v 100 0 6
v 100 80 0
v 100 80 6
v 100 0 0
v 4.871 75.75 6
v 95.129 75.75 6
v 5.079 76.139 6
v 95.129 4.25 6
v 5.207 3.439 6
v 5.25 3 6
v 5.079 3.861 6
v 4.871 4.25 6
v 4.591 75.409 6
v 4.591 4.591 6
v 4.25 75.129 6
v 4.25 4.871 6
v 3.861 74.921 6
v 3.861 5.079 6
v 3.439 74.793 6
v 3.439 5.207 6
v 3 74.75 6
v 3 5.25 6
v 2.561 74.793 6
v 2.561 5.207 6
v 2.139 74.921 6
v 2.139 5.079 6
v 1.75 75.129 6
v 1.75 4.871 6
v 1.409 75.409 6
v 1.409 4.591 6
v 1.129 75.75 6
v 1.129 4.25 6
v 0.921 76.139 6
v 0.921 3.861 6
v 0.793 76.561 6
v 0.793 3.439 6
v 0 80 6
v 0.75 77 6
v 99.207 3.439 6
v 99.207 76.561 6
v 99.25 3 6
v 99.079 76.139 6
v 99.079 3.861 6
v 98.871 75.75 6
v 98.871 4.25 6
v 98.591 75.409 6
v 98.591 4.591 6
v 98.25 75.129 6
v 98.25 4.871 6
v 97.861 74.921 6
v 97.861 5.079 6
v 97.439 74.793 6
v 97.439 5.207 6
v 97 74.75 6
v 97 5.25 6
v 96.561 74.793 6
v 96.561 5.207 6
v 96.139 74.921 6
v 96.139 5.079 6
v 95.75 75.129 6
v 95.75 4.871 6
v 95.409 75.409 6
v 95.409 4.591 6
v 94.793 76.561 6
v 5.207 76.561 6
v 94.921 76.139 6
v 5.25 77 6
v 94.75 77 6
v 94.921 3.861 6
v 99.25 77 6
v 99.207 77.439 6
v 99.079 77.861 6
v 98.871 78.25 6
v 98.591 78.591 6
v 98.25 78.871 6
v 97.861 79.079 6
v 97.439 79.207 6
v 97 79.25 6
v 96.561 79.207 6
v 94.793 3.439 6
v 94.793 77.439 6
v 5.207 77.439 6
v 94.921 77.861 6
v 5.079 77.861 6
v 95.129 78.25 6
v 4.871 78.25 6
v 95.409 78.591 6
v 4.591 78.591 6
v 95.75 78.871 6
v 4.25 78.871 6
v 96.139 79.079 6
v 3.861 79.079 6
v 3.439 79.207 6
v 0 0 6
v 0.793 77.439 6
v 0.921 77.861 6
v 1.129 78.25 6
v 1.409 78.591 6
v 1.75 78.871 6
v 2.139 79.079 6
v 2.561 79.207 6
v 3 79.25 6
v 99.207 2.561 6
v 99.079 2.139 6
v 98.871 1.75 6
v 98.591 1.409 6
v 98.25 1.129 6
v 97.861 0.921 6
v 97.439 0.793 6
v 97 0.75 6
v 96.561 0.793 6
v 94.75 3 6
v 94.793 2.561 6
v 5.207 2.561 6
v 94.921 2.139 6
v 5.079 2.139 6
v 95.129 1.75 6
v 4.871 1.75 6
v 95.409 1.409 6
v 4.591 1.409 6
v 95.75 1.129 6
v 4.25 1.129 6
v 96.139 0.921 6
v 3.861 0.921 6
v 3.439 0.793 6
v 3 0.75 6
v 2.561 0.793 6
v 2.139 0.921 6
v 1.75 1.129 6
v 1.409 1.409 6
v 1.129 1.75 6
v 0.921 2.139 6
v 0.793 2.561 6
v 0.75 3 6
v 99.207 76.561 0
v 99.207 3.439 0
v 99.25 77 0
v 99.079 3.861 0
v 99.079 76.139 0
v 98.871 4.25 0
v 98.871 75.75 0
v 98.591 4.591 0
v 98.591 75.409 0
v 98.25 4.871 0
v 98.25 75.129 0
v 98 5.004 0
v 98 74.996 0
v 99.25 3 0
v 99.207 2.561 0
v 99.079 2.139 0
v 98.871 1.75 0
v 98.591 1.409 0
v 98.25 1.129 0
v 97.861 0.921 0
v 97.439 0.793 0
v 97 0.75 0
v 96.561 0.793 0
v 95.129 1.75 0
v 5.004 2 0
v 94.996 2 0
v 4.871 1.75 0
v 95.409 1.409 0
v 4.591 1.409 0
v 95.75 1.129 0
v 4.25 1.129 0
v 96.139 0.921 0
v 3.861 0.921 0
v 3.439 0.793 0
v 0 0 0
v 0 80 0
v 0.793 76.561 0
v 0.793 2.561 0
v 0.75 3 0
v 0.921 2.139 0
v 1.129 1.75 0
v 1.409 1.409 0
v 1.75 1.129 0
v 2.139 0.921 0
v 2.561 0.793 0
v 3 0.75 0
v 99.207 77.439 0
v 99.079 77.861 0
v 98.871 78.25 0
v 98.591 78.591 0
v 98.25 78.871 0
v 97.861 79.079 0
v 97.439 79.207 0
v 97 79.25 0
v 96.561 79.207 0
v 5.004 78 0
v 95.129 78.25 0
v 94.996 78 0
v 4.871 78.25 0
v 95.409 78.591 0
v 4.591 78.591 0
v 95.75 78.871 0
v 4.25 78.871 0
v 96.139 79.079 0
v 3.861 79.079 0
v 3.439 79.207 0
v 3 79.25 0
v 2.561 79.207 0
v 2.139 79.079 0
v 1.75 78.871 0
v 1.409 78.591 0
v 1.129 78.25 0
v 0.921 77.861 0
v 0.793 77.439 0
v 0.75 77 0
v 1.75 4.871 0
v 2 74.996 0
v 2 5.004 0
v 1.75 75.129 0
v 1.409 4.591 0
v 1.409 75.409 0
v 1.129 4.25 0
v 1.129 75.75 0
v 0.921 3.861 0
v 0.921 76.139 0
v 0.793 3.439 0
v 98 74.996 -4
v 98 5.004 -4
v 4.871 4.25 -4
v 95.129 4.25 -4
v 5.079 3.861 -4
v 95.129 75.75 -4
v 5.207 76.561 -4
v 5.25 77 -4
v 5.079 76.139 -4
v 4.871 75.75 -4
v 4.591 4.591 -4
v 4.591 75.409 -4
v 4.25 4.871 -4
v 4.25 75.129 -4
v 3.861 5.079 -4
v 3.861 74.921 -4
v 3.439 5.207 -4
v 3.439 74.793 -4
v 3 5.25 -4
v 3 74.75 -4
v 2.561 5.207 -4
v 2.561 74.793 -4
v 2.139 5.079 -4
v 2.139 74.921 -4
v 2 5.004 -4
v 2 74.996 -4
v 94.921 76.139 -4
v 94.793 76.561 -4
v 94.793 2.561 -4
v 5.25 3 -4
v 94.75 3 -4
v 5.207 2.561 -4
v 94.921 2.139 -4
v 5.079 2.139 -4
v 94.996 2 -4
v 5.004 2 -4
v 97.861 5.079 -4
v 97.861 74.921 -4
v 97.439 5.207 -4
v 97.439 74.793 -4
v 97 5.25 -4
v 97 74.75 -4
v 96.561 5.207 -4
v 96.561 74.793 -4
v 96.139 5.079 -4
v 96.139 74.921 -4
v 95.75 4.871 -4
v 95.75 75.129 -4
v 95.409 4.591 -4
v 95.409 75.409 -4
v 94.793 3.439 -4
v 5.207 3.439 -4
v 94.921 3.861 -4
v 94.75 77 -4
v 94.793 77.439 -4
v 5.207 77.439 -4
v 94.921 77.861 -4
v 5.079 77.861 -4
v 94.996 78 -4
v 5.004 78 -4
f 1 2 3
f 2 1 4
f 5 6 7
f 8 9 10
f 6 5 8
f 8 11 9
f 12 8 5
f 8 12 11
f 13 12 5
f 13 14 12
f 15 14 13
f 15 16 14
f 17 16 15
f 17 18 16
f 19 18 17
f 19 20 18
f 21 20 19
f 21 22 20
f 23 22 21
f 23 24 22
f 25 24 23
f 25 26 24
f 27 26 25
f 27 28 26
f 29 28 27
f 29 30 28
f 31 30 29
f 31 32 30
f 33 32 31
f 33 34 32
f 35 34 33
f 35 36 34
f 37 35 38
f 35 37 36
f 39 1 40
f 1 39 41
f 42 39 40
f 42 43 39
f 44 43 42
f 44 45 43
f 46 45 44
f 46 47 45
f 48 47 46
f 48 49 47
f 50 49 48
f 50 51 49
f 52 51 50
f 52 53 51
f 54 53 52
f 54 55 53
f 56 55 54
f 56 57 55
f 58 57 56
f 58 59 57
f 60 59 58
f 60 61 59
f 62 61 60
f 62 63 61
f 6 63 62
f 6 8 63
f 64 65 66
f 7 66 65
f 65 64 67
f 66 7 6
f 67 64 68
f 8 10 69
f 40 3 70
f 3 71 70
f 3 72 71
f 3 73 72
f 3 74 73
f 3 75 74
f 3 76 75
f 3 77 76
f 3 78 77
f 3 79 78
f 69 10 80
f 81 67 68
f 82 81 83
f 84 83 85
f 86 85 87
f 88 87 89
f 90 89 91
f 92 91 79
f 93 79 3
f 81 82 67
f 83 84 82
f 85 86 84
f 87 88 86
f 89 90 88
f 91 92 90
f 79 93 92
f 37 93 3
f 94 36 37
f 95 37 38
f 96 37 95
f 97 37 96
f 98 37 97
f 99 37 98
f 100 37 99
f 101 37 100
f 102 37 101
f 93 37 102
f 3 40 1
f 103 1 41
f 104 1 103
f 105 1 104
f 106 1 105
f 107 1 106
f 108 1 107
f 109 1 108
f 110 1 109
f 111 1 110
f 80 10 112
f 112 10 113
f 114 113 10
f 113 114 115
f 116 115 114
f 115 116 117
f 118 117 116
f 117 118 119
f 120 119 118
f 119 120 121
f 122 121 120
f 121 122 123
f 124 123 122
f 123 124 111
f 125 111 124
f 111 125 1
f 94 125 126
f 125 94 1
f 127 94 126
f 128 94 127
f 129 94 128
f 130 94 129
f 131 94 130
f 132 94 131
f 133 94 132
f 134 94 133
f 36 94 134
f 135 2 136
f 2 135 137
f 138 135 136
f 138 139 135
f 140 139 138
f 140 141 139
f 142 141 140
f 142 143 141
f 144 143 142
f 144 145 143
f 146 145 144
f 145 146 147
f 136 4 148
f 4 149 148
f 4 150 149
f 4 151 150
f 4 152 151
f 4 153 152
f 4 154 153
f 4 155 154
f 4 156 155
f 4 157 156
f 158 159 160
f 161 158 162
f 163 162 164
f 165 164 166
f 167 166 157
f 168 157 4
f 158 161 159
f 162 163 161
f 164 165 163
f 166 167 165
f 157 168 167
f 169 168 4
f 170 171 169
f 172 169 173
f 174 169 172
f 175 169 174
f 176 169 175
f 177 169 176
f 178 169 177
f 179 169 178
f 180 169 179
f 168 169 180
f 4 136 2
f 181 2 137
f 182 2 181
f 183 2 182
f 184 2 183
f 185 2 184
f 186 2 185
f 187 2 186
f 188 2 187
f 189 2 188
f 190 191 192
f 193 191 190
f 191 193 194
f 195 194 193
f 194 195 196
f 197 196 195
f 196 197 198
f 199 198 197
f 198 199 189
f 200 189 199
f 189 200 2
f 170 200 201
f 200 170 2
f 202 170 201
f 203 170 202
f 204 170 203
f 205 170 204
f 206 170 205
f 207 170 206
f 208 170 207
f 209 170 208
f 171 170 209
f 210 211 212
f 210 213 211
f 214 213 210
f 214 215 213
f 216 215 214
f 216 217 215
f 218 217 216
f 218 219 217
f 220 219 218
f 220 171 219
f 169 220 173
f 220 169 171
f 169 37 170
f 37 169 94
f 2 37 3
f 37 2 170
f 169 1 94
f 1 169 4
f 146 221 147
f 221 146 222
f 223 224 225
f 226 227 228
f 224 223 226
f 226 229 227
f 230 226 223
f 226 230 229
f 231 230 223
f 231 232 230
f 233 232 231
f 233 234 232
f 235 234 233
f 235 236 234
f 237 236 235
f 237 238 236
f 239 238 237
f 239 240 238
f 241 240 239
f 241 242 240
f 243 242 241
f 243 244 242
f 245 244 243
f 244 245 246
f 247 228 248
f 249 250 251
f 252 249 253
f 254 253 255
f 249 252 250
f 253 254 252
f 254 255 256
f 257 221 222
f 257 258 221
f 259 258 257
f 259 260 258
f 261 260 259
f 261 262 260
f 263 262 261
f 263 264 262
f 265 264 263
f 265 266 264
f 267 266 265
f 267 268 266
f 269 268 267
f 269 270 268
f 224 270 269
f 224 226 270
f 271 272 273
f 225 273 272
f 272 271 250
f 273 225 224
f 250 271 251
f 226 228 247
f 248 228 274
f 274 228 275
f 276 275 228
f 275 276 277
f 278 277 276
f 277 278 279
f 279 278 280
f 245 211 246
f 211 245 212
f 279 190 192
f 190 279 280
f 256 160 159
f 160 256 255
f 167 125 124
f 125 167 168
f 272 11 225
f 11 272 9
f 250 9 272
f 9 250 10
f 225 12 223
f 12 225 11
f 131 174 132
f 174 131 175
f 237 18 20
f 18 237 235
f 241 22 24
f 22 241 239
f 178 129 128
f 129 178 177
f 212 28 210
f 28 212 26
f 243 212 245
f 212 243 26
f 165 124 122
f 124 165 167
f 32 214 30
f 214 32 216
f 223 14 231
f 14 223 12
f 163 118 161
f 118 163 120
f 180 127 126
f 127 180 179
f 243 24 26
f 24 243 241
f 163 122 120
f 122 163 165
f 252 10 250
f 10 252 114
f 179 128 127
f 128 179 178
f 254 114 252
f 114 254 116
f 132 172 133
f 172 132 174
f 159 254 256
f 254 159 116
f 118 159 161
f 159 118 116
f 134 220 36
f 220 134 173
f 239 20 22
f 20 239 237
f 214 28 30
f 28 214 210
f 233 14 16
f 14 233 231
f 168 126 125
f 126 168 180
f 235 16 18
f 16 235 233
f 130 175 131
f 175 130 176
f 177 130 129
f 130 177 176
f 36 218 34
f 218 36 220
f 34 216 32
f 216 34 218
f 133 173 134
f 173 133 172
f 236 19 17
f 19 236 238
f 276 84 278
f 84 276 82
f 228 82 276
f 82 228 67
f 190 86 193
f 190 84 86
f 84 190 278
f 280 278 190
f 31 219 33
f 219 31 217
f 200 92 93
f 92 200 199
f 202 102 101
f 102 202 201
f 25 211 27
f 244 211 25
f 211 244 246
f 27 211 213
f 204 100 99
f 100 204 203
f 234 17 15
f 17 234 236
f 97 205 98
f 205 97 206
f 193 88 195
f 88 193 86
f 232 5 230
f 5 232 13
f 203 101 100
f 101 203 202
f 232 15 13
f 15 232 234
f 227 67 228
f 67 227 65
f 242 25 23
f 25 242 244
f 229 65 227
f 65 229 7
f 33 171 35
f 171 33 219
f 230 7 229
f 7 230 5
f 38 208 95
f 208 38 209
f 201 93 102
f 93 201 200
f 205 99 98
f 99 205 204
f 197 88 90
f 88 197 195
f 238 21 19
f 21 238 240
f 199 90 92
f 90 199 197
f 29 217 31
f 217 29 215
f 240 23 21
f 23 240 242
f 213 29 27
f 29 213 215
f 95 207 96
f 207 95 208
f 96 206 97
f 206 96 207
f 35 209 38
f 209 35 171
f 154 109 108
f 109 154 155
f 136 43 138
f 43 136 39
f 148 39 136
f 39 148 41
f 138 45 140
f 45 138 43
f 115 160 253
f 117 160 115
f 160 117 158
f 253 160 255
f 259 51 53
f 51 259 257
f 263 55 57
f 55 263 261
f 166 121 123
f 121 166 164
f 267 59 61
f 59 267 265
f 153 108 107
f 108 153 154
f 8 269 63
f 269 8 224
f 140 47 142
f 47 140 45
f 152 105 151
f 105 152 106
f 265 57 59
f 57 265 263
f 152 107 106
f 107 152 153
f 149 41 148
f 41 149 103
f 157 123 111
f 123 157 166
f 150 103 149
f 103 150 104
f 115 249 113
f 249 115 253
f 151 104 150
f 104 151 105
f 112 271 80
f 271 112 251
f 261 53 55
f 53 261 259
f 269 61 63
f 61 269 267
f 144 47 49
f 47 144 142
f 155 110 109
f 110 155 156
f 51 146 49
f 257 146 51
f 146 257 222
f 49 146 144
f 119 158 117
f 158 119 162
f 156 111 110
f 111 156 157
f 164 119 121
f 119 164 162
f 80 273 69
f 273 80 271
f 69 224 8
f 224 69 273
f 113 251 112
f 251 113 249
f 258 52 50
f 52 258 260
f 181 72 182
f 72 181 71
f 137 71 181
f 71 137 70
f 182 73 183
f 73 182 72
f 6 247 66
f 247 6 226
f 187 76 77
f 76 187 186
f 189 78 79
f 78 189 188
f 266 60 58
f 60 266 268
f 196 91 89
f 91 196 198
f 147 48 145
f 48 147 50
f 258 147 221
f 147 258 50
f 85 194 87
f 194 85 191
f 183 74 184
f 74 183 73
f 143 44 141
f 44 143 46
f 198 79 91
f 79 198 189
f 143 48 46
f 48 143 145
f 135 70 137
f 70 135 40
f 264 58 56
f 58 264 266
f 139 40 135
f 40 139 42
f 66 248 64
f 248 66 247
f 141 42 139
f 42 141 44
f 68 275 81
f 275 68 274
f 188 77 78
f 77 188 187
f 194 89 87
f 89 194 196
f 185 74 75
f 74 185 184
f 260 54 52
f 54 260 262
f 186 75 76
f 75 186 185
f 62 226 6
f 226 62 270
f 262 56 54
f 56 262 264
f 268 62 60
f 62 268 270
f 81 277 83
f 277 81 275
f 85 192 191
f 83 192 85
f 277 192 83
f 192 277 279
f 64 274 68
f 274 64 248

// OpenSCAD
$fn = 32;

// ----------------------------------------------------------------------
// Enclosure lid: 100 x 80 x 6 mm, 4 bolt holes
// ----------------------------------------------------------------------

// --- parameters (mm) ---
length = 100;             // lid length, X
width = 80;               // lid width, Y
plate_t = 6;              // lid plate thickness
bolt_d = 4.5;             // bolt clearance
boss_lip = 3;             // bolt hole inset from the corner
sink = 1;                 // overlap of the lip and ribs into the plate
lip_h = 5;                // lip height below the plate
lip_wall = 2;             // lip wall thickness

module plate() {
  cube([length, width, plate_t]);
  /* lip that drops into the housing opening, sunk into the plate */
  translate([lip_wall, lip_wall, -lip_h + sink]) cube([length - 2 * lip_wall, width - 2 * lip_wall, lip_h]);
}

difference() {
  plate();
  /* bolt pattern matching the corner bosses */
  for (sx = [0, 1]) for (sy = [0, 1])
    translate([sx * (length - 2 * boss_lip) + boss_lip, sy * (width - 2 * boss_lip) + boss_lip, -lip_h - 1])
      cylinder(h = plate_t + lip_h + 2, d = bolt_d);
}
